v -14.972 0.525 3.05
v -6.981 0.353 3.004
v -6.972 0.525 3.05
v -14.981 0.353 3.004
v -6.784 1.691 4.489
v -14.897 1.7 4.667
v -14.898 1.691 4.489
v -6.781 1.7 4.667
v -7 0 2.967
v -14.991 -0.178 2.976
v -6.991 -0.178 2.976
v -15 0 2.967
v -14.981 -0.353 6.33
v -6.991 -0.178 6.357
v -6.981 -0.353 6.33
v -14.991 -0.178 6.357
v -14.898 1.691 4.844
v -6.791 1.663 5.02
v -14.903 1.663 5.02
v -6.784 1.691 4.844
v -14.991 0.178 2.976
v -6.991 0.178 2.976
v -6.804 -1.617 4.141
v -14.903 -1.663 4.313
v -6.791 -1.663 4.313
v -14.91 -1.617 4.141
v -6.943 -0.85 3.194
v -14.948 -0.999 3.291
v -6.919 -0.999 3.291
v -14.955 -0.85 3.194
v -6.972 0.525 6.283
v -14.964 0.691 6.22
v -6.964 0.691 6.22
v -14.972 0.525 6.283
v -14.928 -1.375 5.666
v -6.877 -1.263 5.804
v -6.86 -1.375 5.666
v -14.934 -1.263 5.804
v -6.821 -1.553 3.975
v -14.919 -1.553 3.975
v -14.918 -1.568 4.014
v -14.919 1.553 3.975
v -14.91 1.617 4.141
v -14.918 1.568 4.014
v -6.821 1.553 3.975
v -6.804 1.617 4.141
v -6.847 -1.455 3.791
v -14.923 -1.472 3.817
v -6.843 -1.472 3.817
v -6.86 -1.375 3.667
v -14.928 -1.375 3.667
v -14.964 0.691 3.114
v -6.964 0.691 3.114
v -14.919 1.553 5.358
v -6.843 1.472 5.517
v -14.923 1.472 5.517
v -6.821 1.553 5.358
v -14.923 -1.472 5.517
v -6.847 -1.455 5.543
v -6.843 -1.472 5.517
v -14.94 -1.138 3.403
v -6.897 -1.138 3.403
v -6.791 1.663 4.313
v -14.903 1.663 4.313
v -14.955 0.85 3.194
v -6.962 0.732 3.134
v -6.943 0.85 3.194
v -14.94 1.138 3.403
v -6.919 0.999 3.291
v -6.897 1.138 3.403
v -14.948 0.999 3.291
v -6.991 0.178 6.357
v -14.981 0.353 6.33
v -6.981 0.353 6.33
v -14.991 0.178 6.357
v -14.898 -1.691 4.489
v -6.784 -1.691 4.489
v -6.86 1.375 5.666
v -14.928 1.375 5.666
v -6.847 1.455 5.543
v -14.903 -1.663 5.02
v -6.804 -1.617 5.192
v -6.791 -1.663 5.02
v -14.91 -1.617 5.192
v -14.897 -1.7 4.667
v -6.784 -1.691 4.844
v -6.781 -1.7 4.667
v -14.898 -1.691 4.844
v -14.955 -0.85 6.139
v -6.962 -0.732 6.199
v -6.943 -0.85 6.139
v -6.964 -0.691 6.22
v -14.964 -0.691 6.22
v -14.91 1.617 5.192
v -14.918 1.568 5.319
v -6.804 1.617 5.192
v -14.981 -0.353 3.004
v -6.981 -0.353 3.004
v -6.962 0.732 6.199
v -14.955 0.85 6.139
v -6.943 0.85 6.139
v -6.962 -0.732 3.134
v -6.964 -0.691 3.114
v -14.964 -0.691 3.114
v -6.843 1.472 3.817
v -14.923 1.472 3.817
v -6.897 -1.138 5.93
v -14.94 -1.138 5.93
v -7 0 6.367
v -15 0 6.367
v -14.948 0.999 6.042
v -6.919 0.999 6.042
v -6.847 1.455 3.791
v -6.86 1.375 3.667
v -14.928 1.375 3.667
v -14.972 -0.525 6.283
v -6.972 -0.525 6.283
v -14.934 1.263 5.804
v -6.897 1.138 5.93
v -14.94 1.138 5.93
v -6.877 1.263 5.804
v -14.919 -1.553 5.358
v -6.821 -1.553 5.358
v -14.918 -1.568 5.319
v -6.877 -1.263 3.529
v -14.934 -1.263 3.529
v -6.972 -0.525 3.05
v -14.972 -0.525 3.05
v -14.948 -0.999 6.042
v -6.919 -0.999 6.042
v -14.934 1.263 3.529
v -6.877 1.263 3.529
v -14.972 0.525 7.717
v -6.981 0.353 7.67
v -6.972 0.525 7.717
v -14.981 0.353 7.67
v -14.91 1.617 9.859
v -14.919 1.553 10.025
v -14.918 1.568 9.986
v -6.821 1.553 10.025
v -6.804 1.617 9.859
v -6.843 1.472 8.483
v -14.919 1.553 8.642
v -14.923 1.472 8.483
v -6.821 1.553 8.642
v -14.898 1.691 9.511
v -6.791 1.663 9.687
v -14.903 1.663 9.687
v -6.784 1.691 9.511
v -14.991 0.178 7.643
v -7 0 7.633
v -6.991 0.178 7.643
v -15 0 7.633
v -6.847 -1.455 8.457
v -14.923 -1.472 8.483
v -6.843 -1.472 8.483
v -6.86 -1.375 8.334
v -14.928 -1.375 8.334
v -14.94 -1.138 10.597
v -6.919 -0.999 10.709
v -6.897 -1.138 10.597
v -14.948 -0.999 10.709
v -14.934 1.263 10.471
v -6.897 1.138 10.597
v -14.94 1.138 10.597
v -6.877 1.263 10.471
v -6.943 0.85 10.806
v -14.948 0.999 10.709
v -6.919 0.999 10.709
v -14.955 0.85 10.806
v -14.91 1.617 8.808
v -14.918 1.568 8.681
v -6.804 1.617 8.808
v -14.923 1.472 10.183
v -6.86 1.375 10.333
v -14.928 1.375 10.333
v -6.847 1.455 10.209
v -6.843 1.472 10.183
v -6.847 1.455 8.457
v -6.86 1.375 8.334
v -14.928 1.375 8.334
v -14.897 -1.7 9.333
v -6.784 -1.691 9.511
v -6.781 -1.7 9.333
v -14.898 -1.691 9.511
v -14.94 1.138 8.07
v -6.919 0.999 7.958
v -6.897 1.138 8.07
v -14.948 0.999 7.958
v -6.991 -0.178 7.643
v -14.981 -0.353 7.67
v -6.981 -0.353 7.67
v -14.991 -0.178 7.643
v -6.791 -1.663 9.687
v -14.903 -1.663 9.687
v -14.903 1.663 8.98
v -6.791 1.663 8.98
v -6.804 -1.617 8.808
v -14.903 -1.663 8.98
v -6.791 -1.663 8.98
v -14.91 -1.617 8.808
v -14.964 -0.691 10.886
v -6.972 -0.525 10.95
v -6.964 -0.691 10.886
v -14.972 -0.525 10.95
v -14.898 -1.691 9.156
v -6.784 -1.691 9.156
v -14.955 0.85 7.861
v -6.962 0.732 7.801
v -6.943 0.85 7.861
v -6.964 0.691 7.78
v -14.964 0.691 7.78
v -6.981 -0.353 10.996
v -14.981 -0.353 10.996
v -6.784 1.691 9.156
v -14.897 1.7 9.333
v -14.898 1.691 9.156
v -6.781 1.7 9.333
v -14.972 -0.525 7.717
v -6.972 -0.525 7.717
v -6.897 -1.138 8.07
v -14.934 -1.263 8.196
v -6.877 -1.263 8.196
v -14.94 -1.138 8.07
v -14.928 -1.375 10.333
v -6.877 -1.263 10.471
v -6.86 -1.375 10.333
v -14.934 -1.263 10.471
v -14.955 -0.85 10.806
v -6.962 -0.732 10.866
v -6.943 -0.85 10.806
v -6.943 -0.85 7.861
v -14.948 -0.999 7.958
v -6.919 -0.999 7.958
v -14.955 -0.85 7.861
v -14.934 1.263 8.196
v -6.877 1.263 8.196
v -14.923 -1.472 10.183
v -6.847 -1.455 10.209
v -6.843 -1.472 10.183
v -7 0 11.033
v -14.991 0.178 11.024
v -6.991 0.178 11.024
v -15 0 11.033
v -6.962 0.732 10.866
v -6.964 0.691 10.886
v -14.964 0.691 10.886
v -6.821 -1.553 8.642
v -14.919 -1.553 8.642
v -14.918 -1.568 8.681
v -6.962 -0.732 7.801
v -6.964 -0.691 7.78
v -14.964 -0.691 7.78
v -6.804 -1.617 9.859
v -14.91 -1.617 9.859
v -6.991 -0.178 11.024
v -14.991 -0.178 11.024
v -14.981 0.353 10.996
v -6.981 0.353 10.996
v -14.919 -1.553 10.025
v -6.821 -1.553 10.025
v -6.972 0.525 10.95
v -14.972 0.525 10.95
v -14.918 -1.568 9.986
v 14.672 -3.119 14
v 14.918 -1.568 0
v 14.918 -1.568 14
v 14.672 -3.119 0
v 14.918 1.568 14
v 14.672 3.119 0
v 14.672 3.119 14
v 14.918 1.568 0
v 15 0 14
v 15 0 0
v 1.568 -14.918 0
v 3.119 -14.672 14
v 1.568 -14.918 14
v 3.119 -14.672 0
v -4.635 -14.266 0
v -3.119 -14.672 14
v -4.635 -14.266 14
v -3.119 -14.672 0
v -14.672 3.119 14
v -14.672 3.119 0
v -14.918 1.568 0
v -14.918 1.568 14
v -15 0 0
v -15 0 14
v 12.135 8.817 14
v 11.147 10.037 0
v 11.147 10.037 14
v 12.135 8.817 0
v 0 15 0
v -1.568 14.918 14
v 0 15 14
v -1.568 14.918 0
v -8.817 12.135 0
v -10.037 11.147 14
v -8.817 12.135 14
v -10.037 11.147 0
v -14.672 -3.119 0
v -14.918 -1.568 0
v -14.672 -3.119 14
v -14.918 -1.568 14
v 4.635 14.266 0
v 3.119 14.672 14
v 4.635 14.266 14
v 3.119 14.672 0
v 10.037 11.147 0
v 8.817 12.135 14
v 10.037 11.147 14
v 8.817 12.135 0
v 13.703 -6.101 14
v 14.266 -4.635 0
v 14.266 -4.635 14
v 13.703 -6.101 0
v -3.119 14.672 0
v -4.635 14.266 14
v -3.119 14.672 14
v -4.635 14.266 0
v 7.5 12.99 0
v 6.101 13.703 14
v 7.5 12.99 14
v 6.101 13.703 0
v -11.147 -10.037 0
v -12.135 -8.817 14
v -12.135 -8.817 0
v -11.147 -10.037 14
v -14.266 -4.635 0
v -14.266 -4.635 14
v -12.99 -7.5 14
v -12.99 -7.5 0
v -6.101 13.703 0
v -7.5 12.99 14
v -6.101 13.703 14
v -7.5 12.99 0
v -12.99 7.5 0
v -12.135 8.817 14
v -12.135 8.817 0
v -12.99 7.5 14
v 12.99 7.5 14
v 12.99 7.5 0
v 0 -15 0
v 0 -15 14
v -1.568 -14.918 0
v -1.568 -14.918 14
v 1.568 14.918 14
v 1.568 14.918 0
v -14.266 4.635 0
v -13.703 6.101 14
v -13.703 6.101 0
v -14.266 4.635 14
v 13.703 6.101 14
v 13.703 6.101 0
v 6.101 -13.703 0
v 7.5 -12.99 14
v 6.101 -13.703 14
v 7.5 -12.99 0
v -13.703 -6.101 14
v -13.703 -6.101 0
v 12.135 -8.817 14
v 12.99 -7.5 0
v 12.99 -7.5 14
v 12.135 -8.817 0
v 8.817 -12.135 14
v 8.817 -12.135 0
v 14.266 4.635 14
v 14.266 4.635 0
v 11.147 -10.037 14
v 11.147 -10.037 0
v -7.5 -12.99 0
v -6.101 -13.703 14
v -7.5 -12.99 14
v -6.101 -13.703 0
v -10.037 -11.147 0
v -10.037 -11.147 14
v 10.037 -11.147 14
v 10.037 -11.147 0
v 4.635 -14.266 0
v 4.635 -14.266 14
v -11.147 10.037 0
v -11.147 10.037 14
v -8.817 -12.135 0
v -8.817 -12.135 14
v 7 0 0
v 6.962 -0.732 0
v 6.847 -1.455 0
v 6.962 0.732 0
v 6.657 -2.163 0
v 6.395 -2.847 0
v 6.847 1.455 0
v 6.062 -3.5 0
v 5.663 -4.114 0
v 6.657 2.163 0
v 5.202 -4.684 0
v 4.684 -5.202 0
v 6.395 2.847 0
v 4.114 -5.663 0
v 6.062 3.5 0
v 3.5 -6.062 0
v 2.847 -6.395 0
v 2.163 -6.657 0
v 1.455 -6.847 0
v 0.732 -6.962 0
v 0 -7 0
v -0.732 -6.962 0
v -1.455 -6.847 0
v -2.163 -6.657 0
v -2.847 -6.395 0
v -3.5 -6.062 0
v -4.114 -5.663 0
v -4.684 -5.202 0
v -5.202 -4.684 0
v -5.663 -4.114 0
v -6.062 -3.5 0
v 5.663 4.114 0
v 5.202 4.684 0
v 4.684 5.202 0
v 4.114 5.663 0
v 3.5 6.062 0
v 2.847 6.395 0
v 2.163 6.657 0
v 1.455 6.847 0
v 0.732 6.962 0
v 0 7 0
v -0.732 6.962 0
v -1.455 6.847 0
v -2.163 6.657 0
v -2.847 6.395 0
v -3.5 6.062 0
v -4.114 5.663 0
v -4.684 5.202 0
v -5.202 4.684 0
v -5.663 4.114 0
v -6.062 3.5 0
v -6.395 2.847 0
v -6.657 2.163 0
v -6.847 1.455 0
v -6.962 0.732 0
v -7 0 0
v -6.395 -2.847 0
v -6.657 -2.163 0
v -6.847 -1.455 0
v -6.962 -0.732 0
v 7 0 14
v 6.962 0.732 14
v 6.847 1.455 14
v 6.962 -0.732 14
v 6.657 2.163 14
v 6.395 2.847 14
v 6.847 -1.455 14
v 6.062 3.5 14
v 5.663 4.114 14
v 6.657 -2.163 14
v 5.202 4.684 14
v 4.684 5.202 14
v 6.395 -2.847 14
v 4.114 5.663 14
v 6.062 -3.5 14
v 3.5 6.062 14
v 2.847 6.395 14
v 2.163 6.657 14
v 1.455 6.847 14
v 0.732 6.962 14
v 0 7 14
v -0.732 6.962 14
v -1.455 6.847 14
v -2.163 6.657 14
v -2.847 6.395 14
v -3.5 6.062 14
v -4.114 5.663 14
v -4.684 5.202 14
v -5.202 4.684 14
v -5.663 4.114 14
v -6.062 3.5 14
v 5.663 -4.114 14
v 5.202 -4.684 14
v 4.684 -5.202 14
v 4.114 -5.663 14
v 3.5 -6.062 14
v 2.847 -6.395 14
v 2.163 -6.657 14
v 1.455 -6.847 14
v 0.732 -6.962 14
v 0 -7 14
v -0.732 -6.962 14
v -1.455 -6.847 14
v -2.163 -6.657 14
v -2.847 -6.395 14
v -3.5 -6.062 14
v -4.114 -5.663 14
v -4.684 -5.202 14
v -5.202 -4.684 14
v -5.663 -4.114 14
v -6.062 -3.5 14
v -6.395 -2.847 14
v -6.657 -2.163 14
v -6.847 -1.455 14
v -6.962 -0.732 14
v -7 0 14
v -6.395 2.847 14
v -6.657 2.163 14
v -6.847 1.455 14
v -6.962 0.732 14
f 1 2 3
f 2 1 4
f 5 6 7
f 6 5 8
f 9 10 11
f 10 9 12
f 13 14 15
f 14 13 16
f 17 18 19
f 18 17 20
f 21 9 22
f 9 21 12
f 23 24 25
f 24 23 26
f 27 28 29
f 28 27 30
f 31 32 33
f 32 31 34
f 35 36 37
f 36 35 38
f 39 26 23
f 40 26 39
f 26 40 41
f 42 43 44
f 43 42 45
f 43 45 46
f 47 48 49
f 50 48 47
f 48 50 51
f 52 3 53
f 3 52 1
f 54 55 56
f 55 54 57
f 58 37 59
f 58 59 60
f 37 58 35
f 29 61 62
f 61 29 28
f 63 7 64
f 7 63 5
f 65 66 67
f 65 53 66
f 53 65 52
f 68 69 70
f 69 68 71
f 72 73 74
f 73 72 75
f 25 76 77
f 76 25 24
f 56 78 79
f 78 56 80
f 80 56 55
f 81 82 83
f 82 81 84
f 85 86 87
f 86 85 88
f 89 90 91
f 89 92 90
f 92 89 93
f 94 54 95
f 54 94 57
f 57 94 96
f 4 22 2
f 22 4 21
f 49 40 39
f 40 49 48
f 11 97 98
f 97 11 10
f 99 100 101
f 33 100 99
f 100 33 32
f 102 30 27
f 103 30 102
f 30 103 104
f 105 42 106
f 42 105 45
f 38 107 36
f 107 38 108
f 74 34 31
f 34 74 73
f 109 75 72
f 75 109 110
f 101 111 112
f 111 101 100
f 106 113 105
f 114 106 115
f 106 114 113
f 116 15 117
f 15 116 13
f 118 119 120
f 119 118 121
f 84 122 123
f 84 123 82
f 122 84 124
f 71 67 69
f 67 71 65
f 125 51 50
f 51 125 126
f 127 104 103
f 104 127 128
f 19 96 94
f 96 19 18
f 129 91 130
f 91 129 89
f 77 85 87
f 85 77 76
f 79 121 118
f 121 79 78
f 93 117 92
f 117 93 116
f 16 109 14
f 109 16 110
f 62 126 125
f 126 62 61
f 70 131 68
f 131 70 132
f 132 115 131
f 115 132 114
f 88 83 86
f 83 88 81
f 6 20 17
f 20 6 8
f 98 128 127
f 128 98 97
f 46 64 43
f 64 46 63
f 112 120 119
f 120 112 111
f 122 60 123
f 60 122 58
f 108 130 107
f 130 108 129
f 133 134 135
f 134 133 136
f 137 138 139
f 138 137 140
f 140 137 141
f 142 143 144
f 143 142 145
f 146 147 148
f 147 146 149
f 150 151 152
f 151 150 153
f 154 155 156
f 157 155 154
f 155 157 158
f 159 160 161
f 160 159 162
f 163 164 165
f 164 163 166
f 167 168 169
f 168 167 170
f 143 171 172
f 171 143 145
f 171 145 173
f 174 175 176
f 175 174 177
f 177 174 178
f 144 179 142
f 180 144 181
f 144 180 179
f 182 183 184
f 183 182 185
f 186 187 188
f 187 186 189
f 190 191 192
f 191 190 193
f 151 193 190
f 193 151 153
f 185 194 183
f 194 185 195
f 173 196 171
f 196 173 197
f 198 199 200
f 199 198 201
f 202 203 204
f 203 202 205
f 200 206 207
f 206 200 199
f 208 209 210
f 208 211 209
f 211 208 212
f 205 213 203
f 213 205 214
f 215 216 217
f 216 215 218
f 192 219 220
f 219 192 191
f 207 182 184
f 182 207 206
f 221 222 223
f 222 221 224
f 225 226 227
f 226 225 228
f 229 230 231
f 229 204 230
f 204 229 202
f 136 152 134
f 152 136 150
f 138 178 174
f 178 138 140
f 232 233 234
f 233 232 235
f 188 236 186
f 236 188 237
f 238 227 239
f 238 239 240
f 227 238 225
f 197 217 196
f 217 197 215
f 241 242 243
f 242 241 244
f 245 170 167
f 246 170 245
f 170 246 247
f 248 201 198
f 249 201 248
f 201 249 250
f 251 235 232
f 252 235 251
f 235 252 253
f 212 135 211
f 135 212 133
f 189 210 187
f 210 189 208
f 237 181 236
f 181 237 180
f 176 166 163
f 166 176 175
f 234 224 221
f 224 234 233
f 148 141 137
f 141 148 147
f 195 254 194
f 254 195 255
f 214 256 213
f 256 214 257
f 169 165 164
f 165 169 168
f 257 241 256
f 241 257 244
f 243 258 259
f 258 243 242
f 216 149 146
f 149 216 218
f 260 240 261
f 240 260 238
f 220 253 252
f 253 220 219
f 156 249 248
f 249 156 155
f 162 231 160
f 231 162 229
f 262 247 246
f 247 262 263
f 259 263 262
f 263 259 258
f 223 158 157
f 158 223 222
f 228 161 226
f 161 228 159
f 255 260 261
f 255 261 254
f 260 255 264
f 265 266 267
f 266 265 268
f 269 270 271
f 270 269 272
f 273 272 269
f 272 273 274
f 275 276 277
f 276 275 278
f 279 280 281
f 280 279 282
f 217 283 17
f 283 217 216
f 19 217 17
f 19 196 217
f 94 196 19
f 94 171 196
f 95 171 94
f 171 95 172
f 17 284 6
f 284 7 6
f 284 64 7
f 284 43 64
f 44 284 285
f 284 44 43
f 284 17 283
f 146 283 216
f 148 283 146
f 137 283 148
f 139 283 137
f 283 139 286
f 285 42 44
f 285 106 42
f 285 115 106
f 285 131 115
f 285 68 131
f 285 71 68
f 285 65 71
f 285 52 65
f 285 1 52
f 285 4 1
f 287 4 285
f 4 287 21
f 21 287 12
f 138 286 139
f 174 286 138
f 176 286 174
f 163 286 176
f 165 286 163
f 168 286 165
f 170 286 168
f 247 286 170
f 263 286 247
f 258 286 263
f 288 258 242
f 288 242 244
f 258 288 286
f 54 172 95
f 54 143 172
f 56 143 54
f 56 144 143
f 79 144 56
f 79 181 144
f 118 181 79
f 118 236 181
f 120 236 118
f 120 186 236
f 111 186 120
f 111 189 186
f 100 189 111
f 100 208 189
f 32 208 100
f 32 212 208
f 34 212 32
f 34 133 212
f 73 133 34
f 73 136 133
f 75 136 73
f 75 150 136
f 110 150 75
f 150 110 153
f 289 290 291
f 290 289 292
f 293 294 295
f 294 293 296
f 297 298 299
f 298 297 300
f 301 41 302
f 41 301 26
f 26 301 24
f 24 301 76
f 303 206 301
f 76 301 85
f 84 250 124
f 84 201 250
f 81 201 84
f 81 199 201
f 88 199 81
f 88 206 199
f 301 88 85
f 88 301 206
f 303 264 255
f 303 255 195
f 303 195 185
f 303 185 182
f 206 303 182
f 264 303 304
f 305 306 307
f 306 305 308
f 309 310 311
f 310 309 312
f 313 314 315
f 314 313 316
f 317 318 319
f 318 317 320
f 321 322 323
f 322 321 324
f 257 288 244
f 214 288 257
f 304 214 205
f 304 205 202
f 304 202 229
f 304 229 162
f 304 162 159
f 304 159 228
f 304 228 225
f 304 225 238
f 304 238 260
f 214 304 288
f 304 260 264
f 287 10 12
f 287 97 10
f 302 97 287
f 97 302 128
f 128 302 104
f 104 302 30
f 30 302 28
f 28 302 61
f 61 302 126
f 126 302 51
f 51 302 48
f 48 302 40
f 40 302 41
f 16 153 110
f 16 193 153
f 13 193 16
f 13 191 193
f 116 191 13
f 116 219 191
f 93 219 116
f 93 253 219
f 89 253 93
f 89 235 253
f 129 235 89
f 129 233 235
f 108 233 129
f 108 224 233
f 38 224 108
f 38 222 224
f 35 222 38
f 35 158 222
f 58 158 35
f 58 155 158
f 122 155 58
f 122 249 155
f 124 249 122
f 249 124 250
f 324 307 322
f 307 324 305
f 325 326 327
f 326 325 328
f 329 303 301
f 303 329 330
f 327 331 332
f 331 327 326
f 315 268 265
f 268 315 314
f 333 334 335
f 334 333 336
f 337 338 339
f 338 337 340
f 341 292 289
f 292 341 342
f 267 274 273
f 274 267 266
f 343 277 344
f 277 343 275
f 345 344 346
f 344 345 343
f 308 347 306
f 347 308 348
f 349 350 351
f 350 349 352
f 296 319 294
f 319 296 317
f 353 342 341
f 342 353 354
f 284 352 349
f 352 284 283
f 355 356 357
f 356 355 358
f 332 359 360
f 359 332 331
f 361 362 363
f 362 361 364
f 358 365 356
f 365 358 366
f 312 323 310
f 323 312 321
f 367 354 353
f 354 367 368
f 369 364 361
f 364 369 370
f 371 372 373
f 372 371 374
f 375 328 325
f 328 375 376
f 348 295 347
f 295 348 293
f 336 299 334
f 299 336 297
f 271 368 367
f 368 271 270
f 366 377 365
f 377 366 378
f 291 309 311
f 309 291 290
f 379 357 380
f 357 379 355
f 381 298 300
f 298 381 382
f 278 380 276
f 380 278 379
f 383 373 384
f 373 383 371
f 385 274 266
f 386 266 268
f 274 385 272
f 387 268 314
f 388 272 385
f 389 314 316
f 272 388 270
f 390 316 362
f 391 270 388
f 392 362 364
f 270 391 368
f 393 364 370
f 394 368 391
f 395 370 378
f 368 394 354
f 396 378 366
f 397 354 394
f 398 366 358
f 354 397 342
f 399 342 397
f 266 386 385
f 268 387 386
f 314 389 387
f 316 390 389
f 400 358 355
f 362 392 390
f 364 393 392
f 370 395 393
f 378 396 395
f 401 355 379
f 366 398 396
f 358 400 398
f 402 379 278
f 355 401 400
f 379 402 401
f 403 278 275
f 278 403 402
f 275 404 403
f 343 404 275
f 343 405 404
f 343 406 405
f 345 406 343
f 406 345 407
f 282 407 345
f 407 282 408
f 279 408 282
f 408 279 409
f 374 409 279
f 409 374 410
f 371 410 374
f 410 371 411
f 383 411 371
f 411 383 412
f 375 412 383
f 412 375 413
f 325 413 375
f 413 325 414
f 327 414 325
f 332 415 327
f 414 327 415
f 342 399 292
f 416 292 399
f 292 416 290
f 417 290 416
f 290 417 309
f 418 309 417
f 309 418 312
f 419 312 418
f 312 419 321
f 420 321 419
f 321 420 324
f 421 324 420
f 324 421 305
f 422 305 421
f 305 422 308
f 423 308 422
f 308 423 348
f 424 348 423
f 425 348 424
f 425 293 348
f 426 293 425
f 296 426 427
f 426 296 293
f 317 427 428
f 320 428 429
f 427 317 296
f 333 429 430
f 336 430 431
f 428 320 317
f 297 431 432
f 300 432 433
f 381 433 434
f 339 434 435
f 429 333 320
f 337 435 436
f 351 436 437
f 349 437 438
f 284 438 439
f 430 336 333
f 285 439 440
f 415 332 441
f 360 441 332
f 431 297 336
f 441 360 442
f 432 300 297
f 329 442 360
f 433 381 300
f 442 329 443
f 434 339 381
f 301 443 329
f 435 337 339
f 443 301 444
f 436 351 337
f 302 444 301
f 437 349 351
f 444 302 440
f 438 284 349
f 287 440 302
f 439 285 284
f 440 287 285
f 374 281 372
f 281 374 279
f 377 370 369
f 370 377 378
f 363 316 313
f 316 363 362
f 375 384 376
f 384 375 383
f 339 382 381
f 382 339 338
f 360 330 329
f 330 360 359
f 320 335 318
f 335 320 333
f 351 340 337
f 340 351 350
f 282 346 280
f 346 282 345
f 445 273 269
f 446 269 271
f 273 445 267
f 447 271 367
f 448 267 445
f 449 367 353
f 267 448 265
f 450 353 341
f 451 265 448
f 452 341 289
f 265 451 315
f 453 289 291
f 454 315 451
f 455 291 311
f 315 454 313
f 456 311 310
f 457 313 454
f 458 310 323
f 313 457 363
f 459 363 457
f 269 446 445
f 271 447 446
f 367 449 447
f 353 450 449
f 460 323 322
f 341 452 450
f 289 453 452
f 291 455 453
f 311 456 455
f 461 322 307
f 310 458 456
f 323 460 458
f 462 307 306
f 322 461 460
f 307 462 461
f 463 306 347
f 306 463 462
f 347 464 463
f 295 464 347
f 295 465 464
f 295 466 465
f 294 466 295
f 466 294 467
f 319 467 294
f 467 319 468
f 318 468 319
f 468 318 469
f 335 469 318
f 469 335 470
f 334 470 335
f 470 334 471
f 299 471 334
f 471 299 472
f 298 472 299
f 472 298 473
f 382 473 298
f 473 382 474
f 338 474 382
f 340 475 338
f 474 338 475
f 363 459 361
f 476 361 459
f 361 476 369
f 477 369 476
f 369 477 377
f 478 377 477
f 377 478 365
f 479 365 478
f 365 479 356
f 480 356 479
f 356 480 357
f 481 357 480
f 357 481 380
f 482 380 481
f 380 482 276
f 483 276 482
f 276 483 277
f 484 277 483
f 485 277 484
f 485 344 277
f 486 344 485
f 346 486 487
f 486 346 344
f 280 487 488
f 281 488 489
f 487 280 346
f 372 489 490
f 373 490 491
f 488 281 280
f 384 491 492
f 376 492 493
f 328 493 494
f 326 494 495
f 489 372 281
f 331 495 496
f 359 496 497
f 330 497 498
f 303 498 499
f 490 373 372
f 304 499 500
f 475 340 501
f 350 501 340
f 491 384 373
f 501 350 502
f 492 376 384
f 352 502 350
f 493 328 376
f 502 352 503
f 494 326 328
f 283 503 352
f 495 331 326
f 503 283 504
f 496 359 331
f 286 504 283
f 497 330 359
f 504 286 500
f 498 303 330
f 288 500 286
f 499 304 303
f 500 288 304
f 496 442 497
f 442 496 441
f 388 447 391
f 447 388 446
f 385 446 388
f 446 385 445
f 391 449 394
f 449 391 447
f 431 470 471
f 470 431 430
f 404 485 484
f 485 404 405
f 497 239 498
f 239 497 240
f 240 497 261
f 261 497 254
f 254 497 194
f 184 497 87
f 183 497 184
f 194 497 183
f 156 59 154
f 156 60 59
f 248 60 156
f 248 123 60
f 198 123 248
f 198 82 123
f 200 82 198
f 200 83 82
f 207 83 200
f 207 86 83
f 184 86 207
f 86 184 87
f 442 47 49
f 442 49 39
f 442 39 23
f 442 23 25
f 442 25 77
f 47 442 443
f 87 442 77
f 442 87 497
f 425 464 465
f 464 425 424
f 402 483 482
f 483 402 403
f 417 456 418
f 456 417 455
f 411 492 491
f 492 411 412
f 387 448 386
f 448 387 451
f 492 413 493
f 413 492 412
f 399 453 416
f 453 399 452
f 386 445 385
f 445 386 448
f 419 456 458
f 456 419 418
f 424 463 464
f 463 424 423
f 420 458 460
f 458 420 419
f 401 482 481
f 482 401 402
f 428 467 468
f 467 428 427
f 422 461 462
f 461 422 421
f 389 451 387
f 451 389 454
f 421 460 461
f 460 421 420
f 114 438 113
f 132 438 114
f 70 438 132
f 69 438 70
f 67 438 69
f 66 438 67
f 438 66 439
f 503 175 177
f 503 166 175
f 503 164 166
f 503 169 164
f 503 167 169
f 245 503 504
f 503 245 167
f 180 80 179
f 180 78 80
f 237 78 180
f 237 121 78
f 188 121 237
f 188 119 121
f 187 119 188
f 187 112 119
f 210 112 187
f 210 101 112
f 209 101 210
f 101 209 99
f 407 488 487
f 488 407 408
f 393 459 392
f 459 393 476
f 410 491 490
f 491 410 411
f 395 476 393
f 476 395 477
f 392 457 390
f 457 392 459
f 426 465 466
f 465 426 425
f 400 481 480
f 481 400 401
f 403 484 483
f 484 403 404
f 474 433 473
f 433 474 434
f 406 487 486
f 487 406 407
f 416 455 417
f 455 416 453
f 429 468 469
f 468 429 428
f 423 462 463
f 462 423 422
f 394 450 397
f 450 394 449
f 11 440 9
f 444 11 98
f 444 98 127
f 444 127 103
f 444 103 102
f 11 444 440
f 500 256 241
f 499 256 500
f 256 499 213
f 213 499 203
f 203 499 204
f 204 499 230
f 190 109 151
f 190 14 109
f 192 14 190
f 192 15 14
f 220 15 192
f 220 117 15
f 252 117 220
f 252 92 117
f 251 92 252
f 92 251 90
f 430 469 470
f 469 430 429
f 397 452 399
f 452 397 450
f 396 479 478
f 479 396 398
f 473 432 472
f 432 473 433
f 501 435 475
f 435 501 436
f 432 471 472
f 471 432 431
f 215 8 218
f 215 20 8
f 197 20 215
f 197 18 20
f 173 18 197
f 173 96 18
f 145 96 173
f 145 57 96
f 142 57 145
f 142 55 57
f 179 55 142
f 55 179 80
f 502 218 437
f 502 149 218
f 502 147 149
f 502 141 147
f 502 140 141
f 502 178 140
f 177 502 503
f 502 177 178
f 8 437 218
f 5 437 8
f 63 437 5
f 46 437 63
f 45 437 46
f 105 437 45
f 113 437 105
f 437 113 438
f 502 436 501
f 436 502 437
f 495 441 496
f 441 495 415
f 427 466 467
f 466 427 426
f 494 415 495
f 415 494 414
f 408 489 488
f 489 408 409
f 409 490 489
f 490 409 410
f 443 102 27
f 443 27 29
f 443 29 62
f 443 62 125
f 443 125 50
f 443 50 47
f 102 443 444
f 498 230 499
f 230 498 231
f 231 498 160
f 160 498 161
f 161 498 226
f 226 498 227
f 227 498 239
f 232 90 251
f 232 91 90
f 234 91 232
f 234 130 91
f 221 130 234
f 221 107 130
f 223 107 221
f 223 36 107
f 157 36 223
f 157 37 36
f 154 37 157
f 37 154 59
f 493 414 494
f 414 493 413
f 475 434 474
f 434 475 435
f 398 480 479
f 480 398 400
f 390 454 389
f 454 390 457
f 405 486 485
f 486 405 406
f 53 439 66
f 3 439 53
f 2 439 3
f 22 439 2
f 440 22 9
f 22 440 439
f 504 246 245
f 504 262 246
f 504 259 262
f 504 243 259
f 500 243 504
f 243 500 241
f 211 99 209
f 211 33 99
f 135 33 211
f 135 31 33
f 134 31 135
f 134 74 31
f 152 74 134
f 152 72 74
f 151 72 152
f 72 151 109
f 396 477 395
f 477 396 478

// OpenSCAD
// Double-screw locking collar.
$fn = 60;
eps = 0.02;
shaft_d = 14;
outer_d = 30;
width = 14;
difference() {
    cylinder(d=outer_d,h=width);
    translate([0,0,-eps]) cylinder(d=shaft_d,h=width+2*eps);
    for (z=[width/3,2*width/3]) translate([-outer_d/2-eps,0,z]) rotate([0,90,0]) cylinder(d=3.4,h=outer_d/2+2*eps);
}
